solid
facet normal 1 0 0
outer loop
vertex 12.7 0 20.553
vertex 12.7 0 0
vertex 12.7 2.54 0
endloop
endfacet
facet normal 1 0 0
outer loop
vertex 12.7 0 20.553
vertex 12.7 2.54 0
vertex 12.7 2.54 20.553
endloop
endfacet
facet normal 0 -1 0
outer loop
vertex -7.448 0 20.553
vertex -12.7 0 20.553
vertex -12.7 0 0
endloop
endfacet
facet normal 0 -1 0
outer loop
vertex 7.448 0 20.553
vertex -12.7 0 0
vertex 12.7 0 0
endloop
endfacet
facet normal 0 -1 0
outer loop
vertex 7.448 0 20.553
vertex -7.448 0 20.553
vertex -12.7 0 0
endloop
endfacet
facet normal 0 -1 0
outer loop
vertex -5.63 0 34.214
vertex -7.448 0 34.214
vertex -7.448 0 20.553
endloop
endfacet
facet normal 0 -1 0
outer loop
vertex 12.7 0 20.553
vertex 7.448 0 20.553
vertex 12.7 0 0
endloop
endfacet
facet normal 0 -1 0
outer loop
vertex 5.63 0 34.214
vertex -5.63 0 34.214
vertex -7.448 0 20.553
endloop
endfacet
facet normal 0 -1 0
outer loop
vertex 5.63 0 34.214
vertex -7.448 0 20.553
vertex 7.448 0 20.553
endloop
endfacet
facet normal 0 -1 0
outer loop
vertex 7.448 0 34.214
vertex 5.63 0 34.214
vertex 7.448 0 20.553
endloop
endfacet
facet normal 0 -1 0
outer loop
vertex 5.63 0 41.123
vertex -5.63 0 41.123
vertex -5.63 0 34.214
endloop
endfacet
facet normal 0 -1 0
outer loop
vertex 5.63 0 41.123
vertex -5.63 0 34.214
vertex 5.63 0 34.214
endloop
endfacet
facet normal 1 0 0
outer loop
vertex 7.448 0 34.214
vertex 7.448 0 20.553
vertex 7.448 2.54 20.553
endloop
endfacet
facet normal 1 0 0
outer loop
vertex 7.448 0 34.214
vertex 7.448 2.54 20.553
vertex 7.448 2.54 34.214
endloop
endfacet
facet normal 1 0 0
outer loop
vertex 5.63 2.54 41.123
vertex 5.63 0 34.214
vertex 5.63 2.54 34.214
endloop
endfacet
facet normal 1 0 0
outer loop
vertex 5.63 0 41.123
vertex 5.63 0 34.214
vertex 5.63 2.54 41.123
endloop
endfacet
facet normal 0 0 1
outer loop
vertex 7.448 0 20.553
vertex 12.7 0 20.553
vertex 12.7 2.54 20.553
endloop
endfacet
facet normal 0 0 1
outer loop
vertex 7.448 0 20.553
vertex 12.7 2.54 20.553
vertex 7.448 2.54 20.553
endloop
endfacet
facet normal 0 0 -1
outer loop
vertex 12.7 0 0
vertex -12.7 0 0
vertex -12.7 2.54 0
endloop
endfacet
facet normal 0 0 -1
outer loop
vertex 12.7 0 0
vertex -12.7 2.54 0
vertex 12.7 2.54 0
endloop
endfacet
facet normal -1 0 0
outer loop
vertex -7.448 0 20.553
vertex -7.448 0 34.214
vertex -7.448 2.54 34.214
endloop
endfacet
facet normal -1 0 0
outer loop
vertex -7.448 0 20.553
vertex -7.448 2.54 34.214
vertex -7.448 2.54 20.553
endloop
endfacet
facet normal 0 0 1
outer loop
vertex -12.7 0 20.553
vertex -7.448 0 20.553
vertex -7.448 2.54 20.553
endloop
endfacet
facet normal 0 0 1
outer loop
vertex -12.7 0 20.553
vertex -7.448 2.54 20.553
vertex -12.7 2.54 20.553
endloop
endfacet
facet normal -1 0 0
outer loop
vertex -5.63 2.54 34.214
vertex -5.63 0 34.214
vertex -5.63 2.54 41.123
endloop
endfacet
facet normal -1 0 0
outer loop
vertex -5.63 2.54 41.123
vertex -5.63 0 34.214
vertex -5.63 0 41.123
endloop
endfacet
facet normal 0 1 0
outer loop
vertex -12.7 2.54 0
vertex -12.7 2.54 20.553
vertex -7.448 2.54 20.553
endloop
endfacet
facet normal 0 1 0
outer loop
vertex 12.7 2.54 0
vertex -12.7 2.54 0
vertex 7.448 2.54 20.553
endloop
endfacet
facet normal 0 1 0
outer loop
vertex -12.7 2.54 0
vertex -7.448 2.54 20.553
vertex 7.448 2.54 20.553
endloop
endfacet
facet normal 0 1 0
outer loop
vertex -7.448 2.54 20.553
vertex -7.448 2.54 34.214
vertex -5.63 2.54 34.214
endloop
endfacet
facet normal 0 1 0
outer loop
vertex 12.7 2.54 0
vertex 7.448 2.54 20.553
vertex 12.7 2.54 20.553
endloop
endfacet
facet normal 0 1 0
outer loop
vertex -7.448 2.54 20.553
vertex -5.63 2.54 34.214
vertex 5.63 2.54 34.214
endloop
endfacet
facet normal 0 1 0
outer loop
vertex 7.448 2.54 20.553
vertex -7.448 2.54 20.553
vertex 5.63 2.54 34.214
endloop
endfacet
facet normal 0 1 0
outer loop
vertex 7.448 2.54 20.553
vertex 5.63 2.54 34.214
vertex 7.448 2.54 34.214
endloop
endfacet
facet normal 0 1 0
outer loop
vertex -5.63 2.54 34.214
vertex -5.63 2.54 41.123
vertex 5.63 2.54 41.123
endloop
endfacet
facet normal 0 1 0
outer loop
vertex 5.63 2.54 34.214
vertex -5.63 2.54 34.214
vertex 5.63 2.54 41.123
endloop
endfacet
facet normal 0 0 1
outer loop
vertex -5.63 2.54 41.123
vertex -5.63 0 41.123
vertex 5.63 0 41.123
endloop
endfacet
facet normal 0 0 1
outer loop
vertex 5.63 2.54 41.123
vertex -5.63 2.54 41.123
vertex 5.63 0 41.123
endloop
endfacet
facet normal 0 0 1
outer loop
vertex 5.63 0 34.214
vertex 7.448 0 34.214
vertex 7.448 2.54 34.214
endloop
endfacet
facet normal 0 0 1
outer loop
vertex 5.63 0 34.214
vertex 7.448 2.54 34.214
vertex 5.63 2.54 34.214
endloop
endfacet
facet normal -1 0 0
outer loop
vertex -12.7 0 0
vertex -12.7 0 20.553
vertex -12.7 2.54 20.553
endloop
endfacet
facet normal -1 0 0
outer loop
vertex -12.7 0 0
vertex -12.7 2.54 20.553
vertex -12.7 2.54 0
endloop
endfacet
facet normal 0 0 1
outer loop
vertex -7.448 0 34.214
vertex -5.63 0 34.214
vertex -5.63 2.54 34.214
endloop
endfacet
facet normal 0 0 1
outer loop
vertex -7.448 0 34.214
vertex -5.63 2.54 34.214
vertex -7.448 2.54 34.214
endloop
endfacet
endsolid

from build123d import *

# Parameters (mm, degrees)
F0_W     = 14.89632
F0_H     = 6.825086
F0_W_2   = 11.260638
F0_H_2   = 6.909038
F1_DEPTH = 2.54


with BuildPart() as f1:
    # F0 (on Front) → F1 (new body)
    with BuildSketch(Plane.XZ):
        Polygon((-12.7, 0), (0, 0), (12.7, 0), (12.7, 20.552527), (7.44816, 20.552527), (-7.44816, 20.552527), (-12.7, 20.552527), align=None)
        with Locations((0, 23.96507)):
            Rectangle(F0_W, F0_H)
        Polygon((-7.44816, 34.213562), (-7.44816, 27.377613), (7.44816, 27.377613), (7.44816, 34.213562), (5.630319, 34.213562), (-5.630319, 34.213562), align=None)
        with Locations((0, 37.668081)):
            Rectangle(F0_W_2, F0_H_2)
    extrude(amount=-F1_DEPTH)


solid = f1.part
